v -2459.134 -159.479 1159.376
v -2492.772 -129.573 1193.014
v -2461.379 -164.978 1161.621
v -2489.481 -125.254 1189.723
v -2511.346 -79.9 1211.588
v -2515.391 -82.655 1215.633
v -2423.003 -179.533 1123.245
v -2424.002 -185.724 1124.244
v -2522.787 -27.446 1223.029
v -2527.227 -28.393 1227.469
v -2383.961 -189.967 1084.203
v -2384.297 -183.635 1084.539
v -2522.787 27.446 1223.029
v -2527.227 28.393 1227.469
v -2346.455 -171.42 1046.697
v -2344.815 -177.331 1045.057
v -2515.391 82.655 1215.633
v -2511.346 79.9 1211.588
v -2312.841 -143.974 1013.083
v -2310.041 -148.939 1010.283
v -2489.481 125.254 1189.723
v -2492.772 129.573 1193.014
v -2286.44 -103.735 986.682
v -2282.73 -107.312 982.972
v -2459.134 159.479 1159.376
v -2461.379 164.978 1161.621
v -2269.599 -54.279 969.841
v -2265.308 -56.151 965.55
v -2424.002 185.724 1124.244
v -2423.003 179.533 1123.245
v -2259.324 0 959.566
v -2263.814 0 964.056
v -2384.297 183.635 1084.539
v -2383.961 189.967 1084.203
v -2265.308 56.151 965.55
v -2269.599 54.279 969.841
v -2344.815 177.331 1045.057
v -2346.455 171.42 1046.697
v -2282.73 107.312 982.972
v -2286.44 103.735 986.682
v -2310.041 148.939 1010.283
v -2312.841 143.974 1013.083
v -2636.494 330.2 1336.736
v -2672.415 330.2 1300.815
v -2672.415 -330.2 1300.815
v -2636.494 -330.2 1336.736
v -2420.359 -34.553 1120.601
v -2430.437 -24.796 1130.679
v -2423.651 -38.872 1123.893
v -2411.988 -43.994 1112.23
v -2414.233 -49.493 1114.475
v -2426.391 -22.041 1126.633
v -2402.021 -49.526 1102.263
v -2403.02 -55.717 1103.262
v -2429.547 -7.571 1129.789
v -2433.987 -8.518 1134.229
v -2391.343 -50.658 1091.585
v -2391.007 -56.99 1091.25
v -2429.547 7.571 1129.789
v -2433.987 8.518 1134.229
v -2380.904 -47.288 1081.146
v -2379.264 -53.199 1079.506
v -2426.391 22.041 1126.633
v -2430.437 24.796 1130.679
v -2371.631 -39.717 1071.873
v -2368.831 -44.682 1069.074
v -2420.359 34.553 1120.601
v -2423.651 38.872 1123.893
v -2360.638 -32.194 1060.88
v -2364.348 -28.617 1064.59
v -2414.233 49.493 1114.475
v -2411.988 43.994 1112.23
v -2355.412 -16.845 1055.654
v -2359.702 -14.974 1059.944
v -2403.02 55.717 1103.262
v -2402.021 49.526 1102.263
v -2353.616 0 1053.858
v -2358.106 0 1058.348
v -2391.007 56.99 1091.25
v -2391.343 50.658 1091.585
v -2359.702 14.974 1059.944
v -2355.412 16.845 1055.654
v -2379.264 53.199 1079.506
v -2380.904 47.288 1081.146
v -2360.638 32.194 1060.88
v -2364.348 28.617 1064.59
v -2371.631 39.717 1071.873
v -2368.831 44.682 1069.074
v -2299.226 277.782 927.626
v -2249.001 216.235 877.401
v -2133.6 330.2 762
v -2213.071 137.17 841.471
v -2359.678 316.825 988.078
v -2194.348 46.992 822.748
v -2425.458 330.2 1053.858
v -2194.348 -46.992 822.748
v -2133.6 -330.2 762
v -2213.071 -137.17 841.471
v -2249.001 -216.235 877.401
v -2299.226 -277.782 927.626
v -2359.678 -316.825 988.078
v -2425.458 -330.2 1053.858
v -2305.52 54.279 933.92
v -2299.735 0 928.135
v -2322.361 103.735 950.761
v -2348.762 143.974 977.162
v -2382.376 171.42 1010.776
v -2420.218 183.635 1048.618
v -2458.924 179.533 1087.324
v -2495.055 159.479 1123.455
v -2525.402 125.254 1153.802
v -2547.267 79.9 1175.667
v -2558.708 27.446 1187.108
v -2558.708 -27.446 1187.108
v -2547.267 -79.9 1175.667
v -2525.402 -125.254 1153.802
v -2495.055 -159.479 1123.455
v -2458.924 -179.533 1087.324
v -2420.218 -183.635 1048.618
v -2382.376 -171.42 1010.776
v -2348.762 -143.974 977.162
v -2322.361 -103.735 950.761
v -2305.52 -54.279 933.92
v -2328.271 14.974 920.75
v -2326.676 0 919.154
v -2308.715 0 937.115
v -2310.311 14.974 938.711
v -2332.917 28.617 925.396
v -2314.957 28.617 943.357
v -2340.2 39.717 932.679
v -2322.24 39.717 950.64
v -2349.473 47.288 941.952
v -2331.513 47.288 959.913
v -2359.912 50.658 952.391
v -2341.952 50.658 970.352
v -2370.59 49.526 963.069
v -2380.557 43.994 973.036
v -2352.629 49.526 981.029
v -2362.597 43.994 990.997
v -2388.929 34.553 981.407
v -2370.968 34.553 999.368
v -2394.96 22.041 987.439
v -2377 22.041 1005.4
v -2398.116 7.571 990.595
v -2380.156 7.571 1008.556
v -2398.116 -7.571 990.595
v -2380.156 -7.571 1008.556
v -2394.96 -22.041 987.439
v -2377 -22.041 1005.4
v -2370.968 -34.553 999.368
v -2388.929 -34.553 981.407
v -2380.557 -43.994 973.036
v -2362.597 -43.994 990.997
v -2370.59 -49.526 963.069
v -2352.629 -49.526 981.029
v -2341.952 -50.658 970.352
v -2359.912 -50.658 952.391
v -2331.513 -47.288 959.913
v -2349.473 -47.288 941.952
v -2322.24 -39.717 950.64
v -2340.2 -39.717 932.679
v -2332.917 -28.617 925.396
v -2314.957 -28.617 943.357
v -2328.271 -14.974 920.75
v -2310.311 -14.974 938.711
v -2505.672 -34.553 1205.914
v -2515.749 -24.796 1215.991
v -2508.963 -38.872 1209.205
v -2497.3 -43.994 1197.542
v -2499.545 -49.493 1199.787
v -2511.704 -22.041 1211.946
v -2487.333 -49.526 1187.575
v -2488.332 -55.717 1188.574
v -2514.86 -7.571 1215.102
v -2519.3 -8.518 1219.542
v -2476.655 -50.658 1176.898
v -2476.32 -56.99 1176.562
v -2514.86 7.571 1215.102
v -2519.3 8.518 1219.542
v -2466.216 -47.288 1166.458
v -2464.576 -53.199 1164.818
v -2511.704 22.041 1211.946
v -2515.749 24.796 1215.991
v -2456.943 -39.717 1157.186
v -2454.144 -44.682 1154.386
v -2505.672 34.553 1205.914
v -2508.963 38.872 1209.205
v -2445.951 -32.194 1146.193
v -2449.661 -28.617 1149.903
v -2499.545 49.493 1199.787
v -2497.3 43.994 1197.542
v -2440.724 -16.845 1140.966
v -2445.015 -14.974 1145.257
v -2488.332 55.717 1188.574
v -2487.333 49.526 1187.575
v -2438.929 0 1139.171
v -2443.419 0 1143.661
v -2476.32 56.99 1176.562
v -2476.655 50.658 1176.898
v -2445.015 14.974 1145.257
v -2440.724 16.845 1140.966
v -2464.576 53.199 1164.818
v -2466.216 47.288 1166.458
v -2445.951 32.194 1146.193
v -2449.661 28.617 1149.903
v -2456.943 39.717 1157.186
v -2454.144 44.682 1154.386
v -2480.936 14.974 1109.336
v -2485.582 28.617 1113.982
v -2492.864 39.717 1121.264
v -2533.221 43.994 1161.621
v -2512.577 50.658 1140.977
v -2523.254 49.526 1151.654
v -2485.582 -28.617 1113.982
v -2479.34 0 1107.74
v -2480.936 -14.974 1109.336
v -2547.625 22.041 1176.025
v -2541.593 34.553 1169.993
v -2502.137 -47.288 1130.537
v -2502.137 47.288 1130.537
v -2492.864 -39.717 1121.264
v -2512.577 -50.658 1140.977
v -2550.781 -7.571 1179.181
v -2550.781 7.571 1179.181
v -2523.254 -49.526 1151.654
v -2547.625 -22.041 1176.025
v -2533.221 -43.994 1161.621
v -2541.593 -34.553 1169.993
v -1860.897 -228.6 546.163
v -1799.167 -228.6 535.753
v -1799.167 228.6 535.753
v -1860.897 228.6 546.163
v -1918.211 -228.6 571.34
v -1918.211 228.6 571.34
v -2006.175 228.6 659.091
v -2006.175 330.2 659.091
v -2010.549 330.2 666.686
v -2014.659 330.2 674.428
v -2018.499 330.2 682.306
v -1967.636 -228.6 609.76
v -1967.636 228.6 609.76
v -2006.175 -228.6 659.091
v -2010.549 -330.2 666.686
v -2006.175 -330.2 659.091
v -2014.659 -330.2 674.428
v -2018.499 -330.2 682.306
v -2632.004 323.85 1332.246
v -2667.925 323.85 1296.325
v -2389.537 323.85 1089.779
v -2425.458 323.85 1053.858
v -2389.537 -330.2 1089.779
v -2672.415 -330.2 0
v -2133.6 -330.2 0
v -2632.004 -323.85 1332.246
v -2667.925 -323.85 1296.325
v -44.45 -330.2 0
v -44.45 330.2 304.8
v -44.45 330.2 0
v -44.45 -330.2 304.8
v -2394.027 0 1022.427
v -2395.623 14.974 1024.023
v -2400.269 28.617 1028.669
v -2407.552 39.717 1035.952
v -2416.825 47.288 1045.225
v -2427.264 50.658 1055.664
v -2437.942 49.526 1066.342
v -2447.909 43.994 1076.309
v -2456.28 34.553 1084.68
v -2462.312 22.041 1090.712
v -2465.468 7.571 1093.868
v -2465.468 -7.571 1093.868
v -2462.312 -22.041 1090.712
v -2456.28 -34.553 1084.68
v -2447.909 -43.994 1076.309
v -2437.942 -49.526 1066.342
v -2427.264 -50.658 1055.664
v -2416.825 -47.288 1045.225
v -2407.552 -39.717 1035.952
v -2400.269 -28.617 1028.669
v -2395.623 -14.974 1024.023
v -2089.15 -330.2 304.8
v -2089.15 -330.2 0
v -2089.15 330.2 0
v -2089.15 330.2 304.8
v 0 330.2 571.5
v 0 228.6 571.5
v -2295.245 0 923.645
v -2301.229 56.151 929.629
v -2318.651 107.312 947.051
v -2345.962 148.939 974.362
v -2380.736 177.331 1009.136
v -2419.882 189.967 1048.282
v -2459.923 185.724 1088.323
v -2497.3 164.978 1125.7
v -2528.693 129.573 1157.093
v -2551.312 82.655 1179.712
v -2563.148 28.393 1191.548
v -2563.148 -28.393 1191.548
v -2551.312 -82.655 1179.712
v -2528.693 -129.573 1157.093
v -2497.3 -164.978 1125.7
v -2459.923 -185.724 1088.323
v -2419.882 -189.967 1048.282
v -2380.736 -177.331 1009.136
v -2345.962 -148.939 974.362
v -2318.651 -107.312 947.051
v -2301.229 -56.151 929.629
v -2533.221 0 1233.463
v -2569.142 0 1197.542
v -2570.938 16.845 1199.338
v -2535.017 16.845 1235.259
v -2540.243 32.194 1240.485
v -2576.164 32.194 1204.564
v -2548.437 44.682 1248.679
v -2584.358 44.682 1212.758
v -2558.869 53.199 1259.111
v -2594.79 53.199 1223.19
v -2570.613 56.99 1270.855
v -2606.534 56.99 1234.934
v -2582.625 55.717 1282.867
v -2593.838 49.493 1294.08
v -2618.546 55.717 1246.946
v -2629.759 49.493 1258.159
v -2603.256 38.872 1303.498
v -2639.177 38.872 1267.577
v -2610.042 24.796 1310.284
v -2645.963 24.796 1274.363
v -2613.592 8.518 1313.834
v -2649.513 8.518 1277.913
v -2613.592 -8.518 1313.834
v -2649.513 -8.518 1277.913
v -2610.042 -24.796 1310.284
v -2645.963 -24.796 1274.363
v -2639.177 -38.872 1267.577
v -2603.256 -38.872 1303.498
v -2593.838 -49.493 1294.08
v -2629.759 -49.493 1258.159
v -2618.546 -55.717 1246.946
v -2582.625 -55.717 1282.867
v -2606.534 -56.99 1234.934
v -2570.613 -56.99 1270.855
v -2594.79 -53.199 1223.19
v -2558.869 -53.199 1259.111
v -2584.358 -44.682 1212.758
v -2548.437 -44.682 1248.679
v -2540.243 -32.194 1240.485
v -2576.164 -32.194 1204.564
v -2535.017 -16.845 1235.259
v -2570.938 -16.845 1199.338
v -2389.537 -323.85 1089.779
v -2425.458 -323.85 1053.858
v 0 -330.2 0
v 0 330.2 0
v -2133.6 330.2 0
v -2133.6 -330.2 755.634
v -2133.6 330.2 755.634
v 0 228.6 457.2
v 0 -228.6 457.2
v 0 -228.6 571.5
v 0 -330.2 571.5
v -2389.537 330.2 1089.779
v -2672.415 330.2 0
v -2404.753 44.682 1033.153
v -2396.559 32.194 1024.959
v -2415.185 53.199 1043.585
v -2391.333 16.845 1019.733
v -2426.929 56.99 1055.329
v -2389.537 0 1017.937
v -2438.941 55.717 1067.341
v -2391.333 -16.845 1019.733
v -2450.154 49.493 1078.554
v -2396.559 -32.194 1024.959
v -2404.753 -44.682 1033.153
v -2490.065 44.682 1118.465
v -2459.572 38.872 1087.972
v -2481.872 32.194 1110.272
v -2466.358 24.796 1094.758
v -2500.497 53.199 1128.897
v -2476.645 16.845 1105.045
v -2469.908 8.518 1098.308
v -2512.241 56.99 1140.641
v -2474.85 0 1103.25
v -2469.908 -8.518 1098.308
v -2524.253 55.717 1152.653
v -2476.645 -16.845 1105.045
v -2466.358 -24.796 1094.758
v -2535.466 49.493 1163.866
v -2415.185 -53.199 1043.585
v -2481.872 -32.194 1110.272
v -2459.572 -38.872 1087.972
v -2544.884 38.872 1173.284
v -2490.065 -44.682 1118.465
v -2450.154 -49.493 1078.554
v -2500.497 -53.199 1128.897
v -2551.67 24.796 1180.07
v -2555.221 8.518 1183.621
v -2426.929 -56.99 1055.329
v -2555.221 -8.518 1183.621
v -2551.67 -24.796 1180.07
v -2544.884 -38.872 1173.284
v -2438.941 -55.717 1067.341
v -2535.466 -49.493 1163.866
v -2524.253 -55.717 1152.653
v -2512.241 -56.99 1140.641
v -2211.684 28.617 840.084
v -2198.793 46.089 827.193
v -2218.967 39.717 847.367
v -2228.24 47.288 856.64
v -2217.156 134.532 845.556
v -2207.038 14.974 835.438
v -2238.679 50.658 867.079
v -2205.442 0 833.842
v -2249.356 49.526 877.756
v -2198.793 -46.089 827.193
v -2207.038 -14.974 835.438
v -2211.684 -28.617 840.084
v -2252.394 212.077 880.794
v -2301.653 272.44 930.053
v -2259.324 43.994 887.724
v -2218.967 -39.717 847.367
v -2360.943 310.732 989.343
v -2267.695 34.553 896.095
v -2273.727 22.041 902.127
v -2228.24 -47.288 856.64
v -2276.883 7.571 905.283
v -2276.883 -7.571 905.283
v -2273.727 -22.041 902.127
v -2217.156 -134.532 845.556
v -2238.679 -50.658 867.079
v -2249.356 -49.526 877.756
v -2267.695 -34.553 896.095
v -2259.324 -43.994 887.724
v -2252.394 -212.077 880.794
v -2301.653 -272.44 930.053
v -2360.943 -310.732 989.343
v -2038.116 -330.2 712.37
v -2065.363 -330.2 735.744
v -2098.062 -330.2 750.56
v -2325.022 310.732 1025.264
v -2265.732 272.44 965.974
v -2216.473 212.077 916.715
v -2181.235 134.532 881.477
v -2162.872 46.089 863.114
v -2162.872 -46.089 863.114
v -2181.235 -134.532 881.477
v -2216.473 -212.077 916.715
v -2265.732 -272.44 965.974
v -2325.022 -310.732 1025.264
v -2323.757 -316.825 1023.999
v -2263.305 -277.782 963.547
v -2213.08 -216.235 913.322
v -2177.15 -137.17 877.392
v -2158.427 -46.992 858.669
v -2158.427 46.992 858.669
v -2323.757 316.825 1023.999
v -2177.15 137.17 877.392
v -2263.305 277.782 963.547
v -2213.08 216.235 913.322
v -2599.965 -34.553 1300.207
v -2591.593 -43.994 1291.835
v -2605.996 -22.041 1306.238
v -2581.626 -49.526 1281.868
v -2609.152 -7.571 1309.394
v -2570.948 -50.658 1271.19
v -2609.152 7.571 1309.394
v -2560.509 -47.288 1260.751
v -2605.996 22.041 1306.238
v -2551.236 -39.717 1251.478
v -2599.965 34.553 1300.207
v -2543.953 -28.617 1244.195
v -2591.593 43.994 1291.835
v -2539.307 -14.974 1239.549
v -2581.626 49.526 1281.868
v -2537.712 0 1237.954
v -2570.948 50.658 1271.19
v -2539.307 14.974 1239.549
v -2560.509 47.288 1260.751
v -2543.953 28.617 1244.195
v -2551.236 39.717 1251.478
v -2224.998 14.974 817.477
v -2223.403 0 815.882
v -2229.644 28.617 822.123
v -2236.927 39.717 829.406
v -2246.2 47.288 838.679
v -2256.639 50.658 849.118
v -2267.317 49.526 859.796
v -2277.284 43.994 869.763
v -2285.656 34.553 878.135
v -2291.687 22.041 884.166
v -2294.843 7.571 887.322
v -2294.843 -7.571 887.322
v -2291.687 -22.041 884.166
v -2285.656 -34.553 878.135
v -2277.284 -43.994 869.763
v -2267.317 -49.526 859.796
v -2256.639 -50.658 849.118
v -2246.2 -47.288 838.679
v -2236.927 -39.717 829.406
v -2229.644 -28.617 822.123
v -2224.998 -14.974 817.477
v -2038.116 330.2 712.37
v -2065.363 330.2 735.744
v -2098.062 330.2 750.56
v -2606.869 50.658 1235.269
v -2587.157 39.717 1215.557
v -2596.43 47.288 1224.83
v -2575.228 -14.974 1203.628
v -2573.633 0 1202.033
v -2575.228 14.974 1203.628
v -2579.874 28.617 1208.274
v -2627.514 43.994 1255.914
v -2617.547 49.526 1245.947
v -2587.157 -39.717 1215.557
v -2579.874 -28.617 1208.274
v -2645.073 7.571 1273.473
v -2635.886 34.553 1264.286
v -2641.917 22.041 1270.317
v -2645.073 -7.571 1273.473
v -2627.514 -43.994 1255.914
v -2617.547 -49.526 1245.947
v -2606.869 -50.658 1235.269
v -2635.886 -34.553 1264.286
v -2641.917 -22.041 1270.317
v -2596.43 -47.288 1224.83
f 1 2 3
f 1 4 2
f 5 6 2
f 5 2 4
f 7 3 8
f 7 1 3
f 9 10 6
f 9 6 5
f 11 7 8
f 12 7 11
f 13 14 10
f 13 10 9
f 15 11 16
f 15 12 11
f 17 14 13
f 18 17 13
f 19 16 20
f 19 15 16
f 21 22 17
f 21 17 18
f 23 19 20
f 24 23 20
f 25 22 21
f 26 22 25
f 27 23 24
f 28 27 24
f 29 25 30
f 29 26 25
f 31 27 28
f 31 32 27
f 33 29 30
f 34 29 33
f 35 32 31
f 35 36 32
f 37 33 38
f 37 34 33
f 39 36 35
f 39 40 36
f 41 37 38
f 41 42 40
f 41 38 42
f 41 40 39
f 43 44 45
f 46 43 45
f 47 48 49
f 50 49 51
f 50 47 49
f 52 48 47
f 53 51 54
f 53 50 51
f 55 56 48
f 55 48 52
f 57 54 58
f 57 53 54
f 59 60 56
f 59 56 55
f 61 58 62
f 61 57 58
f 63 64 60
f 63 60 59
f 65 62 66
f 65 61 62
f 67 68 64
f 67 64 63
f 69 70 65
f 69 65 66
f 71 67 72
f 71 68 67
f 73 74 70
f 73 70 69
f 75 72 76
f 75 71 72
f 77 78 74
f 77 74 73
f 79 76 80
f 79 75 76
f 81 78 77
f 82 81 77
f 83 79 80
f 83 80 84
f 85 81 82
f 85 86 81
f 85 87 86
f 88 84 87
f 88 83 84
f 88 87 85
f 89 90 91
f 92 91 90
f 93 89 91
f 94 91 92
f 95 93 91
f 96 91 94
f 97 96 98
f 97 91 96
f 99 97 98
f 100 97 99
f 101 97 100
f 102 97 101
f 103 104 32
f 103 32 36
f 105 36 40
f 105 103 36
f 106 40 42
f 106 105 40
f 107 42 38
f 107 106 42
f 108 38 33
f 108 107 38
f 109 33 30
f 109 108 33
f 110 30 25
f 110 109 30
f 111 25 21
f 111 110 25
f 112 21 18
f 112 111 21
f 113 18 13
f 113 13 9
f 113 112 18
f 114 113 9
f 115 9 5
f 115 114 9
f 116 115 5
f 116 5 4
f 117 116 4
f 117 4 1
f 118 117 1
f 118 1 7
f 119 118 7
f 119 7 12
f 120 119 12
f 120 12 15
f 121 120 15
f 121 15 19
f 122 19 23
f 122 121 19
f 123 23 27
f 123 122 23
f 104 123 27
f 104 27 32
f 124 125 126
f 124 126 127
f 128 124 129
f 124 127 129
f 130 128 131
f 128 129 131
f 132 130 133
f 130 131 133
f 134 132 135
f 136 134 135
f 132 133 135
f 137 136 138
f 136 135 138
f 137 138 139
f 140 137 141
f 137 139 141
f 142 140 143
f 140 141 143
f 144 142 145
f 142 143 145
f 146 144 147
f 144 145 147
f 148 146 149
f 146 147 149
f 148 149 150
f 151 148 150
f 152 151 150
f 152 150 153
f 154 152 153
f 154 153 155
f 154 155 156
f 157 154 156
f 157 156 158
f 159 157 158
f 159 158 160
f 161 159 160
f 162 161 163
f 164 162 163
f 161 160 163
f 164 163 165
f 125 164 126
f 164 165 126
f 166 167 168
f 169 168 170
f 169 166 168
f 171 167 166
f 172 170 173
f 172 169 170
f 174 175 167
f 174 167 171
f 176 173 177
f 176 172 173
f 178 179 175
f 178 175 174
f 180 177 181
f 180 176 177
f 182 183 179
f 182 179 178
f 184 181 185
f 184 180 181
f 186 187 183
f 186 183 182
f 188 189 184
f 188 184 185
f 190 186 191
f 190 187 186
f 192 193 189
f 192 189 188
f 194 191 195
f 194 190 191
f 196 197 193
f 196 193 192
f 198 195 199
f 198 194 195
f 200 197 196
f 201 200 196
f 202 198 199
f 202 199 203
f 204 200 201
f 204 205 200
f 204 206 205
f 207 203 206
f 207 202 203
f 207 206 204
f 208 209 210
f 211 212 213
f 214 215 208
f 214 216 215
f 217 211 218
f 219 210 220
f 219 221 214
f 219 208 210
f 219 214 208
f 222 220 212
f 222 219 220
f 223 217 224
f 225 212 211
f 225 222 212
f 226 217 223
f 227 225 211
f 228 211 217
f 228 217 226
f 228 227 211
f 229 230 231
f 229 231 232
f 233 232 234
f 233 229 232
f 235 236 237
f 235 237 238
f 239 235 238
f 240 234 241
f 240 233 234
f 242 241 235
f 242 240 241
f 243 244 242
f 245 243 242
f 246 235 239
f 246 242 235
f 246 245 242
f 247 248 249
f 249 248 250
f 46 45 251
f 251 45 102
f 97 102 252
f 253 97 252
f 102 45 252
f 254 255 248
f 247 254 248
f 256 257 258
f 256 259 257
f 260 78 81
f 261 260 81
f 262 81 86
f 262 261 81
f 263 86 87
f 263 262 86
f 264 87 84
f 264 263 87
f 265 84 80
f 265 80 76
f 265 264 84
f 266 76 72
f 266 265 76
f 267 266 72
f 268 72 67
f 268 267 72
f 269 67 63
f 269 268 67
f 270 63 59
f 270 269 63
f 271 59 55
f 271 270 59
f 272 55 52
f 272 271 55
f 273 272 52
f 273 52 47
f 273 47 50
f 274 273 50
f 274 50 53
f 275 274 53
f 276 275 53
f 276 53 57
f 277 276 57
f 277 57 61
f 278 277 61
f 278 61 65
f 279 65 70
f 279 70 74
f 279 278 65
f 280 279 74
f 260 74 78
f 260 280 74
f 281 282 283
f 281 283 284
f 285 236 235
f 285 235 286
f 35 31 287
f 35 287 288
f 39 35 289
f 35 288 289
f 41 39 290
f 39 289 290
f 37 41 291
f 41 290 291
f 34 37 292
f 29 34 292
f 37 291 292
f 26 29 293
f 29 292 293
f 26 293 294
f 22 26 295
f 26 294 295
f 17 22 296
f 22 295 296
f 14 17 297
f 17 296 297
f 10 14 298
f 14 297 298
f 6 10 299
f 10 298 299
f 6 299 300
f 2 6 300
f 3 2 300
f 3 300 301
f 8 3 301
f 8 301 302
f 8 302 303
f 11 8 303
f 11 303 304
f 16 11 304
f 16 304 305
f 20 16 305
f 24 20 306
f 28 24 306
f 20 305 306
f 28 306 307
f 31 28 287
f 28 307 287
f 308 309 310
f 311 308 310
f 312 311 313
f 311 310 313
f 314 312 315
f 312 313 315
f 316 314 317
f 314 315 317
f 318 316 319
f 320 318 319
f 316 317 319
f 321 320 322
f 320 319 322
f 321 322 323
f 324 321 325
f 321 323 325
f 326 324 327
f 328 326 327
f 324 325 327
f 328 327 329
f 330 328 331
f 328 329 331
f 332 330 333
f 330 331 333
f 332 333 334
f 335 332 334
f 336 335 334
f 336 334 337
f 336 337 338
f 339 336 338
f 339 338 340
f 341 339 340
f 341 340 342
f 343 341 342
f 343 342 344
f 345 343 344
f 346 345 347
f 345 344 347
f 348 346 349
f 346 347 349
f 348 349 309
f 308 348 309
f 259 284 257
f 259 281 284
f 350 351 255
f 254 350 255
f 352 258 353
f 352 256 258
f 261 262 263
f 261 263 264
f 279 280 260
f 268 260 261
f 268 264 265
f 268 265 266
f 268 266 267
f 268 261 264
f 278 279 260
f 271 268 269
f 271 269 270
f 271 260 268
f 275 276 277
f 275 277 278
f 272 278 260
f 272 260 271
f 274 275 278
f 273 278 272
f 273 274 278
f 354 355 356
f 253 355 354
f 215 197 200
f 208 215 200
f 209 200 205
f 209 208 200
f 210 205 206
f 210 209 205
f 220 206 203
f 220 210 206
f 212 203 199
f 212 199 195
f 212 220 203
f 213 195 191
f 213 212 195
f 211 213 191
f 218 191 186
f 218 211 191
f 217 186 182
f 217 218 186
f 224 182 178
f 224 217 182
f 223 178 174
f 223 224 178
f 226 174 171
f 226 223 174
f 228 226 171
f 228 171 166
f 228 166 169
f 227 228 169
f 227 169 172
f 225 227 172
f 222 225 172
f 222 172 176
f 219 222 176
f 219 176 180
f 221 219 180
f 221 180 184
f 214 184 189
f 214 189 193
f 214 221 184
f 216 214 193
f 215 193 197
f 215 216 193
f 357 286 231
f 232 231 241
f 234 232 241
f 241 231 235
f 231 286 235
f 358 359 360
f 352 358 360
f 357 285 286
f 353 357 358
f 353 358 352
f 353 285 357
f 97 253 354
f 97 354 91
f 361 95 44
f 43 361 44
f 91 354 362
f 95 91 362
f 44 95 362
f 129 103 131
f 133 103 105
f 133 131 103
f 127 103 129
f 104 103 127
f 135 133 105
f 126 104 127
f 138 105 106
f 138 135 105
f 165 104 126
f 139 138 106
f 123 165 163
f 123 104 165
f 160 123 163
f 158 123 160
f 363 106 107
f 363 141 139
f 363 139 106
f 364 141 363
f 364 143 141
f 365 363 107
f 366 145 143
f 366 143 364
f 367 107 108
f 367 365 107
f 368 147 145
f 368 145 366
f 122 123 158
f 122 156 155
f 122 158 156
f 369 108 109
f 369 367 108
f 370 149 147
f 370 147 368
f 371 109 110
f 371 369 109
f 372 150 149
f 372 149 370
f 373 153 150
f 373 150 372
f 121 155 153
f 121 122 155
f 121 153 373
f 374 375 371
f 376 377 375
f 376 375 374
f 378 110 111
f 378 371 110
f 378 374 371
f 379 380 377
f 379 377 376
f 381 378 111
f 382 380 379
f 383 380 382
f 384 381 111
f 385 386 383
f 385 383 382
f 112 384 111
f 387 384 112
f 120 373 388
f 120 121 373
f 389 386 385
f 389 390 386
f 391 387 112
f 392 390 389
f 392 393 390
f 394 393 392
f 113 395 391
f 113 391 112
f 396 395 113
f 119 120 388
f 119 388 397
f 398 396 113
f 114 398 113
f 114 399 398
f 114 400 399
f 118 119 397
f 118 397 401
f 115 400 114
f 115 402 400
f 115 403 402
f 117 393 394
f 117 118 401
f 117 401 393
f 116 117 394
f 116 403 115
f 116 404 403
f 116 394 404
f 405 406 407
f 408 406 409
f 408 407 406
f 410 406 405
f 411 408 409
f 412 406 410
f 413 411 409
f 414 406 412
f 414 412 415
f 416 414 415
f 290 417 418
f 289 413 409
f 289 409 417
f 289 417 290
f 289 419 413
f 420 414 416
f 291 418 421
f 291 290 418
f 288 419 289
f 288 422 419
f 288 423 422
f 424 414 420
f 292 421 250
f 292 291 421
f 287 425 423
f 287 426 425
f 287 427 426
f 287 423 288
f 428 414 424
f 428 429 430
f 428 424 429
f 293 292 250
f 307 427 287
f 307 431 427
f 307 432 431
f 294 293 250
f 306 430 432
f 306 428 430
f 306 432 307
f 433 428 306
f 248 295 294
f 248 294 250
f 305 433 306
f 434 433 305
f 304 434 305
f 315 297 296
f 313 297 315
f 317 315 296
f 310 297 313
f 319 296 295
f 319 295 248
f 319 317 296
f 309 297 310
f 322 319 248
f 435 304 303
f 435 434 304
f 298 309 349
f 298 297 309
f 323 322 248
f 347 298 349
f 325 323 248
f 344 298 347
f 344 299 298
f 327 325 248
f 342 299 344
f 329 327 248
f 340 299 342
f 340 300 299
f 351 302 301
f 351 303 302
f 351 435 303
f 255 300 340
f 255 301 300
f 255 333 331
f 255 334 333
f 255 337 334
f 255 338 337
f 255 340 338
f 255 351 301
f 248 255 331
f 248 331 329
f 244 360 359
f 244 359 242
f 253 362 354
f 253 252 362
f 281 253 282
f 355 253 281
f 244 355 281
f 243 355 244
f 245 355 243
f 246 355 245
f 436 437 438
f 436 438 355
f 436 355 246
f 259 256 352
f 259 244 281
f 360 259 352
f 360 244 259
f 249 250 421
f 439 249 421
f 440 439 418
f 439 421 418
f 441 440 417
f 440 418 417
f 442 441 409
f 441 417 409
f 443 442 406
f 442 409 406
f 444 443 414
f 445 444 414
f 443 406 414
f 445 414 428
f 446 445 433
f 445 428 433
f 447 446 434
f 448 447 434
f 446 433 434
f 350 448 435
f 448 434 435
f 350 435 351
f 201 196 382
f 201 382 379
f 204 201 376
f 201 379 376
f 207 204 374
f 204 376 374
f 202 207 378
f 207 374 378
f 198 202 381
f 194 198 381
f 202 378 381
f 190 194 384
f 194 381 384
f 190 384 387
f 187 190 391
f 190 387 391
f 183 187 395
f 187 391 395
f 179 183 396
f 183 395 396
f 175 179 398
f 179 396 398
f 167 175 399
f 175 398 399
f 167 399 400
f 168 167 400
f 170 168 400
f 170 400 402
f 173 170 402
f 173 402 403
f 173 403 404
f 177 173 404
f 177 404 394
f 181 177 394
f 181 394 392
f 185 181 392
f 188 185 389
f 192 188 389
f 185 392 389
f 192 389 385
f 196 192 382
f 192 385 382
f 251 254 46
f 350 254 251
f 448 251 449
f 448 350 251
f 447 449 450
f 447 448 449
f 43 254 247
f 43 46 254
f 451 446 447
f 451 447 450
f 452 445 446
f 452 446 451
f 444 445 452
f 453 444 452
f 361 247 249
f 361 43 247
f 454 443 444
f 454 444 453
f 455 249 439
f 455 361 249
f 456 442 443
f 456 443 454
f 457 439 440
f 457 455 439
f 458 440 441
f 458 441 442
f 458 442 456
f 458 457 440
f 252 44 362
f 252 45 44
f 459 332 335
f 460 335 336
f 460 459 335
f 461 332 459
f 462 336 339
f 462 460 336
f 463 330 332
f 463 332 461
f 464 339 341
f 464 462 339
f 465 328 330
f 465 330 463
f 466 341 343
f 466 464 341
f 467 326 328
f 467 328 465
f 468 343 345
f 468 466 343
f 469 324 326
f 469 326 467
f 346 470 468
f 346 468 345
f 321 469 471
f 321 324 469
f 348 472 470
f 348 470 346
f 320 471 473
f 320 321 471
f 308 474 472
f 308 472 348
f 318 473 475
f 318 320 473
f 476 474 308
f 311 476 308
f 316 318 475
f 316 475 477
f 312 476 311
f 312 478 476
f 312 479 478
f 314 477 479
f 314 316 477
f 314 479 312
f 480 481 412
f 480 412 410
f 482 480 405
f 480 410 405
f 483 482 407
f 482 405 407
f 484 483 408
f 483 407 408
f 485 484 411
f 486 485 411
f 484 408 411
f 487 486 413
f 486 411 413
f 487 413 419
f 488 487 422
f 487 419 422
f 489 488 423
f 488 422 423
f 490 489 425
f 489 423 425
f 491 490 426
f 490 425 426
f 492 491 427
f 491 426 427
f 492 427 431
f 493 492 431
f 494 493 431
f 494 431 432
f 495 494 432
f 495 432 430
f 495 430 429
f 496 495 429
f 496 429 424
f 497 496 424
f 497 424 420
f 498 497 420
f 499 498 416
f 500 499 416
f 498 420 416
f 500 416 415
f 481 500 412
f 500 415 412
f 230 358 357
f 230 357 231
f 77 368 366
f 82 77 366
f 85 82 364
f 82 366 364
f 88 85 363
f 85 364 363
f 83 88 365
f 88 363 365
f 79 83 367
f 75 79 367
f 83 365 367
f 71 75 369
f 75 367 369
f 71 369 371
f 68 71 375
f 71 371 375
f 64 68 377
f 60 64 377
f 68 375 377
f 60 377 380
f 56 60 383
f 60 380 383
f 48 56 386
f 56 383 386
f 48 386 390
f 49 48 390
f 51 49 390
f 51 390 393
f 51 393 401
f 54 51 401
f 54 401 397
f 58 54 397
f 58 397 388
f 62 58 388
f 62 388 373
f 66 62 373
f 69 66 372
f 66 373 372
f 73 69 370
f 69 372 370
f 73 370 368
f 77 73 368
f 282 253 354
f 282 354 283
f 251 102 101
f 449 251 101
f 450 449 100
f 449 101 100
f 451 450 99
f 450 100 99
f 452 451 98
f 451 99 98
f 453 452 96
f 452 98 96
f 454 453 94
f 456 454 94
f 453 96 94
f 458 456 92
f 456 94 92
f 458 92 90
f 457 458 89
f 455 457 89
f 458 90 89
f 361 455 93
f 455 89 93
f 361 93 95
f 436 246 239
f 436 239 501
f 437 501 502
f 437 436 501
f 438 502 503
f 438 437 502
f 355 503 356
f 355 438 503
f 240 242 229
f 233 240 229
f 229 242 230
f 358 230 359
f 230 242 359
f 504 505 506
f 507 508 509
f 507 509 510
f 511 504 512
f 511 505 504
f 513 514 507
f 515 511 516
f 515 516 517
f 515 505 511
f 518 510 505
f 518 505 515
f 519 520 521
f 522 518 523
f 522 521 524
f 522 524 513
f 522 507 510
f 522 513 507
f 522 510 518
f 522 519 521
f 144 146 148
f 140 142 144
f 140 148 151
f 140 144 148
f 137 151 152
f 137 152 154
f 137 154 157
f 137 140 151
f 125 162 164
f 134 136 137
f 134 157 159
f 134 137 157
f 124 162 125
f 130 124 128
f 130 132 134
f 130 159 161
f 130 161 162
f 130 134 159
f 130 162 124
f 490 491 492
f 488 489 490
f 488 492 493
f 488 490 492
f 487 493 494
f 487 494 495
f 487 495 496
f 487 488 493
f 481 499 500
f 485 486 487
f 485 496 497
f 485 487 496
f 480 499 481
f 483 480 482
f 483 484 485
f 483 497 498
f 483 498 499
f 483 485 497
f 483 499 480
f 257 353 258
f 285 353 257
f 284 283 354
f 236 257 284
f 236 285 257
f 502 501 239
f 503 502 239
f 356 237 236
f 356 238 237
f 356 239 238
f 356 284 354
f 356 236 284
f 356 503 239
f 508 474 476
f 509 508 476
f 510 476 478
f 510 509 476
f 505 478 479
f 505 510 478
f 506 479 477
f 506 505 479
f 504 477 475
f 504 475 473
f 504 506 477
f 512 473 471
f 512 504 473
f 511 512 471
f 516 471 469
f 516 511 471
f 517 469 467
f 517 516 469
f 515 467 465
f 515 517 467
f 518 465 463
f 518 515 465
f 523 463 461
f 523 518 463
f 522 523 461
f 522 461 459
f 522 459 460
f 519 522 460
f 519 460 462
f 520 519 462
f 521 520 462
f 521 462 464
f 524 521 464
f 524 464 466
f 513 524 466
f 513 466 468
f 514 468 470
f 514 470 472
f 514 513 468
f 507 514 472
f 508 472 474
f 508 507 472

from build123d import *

# Parameters (mm, degrees)
F2_DEPTH  = 330.2
F4_DEPTH  = 330.2
F5_R      = 190.5
F5_R_2    = 184.15
F5_R_3    = 57.15
F5_R_4    = 50.8
F6_DEPTH  = 50.8
F7_DEPTH  = 25.4
F9_DEPTH  = 101.6
F11_DEPTH = 101.6


# Not quite as in the source:
# - a variable given as a bare number and used for a length is read in inches; the dataset says mm whatever the document's units were


with BuildPart() as f2:
    # F1 (on Front) → F2 (new body, symmetric)
    with BuildSketch(Plane.XZ):
        with BuildLine():
            Line((-44.45, 0), (0, 0))
            Line((0, 0), (0, 457.2))
            Line((0, 457.2), (-1799.1673024383, 535.7533408746))
            ThreePointArc((-1799.1673024383, 535.7533408746), (-1929.3267001402, 578.3588586439), (-2018.4989110463, 682.306036367))
            ThreePointArc((-2018.4989110463, 682.306036367), (-2065.36294974, 735.7442307441), (-2133.6, 755.6335171259))
            Line((-2133.6, 755.6335171259), (-2133.6, 0))
            Line((-2133.6, 0), (-2089.15, 0))
            Line((-2089.15, 0), (-2089.15, 304.8))
            Line((-2089.15, 304.8), (-44.45, 304.8))
            Line((-44.45, 304.8), (-44.45, 0))
        make_face()
    extrude(amount=F2_DEPTH, both=True)

    # F8 (on face) → F9 (join)
    with BuildSketch(Plane.XZ.offset(330.2)):
        with BuildLine():
            Line((-1799.1673024383, 535.7533408746), (0, 457.2))
            Line((0, 457.2), (0, 571.5))
            Line((0, 571.5), (-2006.1747965862, 659.0914832582))
            ThreePointArc((-2006.1747965862, 659.0914832582), (-1918.2110987992, 571.3404020762), (-1799.1673024383, 535.7533408746))
        make_face()
    extrude(amount=-F9_DEPTH)

    # F10 (on face) → F11 (join)
    with BuildSketch(Plane(origin=(0, 330.2, 0), x_dir=(-1, 0, 0), z_dir=(0, 1, 0))):
        with BuildLine():
            Line((2006.1747965862, 659.0914832582), (0, 571.5))
            Line((0, 571.5), (0, 457.2))
            Line((0, 457.2), (1799.1673024383, 535.7533408746))
            ThreePointArc((1799.1673024383, 535.7533408746), (1918.2110987992, 571.3404020762), (2006.1747965862, 659.0914832582))
        make_face()
    extrude(amount=-F11_DEPTH)


with BuildPart() as f4:
    # F3 (on Front) → F4 (new body, symmetric)
    with BuildSketch(Plane.XZ):
        Polygon((-2672.4153672641, 0), (-2133.6, 0), (-2133.6, 762), (-2672.4153672641, 1300.8153672641), align=None)
    extrude(amount=F4_DEPTH, both=True)

    # F5 (on face) → F6 (join)
    with BuildSketch(Plane(origin=(-685.8, 0, -685.8), x_dir=(0.7071067812, 0, -0.7071067812), z_dir=(0.7071067812, 0, 0.7071067812))):
        with BuildLine():
            Line((-2809.4983956038, -330.2), (-2460.2483956038, -330.2))
            ThreePointArc((-2460.2483956038, -330.2), (-2130.0483956038, 0), (-2460.2483956038, 330.2))
            Line((-2460.2483956038, 330.2), (-2809.4983956038, 330.2))
            Line((-2809.4983956038, 330.2), (-2809.4983956038, -330.2))
        make_face()
        with BuildLine():
            ThreePointArc((-2460.2483956038, 323.85), (-2136.3983956038, 0), (-2460.2483956038, -323.85))
            Line((-2460.2483956038, -323.85), (-2803.1483956038, -323.85))
            Line((-2803.1483956038, -323.85), (-2803.1483956038, 323.85))
            Line((-2803.1483956038, 323.85), (-2460.2483956038, 323.85))
        make_face(mode=Mode.SUBTRACT)
        with Locations((-2466.5983956038, 0)):
            Circle(F5_R)
        with Locations((-2466.5983956038, 0)):
            Circle(F5_R_2, mode=Mode.SUBTRACT)
        with Locations((-2466.5983956038, 0)):
            Circle(F5_R_3)
        with Locations((-2466.5983956038, 0)):
            Circle(F5_R_4, mode=Mode.SUBTRACT)
        with Locations((-2587.2483956038, 0)):
            Circle(F5_R_3)
        with Locations((-2587.2483956038, 0)):
            Circle(F5_R_4, mode=Mode.SUBTRACT)
        with Locations((-2720.5983956038, 0)):
            Circle(F5_R_3)
        with Locations((-2720.5983956038, 0)):
            Circle(F5_R_4, mode=Mode.SUBTRACT)
    extrude(amount=F6_DEPTH)

    # F5 (on face) → F7 (cut)
    with BuildSketch(Plane(origin=(-685.8, 0, -685.8), x_dir=(0.7071067812, 0, -0.7071067812), z_dir=(0.7071067812, 0, 0.7071067812))):
        with Locations((-2199.8983956038, 0)):
            Circle(F5_R_4)
        with Locations((-2345.9483956038, 0)):
            Circle(F5_R_4)
    extrude(amount=-F7_DEPTH, mode=Mode.SUBTRACT)


solid = Compound([f2.part, f4.part])
